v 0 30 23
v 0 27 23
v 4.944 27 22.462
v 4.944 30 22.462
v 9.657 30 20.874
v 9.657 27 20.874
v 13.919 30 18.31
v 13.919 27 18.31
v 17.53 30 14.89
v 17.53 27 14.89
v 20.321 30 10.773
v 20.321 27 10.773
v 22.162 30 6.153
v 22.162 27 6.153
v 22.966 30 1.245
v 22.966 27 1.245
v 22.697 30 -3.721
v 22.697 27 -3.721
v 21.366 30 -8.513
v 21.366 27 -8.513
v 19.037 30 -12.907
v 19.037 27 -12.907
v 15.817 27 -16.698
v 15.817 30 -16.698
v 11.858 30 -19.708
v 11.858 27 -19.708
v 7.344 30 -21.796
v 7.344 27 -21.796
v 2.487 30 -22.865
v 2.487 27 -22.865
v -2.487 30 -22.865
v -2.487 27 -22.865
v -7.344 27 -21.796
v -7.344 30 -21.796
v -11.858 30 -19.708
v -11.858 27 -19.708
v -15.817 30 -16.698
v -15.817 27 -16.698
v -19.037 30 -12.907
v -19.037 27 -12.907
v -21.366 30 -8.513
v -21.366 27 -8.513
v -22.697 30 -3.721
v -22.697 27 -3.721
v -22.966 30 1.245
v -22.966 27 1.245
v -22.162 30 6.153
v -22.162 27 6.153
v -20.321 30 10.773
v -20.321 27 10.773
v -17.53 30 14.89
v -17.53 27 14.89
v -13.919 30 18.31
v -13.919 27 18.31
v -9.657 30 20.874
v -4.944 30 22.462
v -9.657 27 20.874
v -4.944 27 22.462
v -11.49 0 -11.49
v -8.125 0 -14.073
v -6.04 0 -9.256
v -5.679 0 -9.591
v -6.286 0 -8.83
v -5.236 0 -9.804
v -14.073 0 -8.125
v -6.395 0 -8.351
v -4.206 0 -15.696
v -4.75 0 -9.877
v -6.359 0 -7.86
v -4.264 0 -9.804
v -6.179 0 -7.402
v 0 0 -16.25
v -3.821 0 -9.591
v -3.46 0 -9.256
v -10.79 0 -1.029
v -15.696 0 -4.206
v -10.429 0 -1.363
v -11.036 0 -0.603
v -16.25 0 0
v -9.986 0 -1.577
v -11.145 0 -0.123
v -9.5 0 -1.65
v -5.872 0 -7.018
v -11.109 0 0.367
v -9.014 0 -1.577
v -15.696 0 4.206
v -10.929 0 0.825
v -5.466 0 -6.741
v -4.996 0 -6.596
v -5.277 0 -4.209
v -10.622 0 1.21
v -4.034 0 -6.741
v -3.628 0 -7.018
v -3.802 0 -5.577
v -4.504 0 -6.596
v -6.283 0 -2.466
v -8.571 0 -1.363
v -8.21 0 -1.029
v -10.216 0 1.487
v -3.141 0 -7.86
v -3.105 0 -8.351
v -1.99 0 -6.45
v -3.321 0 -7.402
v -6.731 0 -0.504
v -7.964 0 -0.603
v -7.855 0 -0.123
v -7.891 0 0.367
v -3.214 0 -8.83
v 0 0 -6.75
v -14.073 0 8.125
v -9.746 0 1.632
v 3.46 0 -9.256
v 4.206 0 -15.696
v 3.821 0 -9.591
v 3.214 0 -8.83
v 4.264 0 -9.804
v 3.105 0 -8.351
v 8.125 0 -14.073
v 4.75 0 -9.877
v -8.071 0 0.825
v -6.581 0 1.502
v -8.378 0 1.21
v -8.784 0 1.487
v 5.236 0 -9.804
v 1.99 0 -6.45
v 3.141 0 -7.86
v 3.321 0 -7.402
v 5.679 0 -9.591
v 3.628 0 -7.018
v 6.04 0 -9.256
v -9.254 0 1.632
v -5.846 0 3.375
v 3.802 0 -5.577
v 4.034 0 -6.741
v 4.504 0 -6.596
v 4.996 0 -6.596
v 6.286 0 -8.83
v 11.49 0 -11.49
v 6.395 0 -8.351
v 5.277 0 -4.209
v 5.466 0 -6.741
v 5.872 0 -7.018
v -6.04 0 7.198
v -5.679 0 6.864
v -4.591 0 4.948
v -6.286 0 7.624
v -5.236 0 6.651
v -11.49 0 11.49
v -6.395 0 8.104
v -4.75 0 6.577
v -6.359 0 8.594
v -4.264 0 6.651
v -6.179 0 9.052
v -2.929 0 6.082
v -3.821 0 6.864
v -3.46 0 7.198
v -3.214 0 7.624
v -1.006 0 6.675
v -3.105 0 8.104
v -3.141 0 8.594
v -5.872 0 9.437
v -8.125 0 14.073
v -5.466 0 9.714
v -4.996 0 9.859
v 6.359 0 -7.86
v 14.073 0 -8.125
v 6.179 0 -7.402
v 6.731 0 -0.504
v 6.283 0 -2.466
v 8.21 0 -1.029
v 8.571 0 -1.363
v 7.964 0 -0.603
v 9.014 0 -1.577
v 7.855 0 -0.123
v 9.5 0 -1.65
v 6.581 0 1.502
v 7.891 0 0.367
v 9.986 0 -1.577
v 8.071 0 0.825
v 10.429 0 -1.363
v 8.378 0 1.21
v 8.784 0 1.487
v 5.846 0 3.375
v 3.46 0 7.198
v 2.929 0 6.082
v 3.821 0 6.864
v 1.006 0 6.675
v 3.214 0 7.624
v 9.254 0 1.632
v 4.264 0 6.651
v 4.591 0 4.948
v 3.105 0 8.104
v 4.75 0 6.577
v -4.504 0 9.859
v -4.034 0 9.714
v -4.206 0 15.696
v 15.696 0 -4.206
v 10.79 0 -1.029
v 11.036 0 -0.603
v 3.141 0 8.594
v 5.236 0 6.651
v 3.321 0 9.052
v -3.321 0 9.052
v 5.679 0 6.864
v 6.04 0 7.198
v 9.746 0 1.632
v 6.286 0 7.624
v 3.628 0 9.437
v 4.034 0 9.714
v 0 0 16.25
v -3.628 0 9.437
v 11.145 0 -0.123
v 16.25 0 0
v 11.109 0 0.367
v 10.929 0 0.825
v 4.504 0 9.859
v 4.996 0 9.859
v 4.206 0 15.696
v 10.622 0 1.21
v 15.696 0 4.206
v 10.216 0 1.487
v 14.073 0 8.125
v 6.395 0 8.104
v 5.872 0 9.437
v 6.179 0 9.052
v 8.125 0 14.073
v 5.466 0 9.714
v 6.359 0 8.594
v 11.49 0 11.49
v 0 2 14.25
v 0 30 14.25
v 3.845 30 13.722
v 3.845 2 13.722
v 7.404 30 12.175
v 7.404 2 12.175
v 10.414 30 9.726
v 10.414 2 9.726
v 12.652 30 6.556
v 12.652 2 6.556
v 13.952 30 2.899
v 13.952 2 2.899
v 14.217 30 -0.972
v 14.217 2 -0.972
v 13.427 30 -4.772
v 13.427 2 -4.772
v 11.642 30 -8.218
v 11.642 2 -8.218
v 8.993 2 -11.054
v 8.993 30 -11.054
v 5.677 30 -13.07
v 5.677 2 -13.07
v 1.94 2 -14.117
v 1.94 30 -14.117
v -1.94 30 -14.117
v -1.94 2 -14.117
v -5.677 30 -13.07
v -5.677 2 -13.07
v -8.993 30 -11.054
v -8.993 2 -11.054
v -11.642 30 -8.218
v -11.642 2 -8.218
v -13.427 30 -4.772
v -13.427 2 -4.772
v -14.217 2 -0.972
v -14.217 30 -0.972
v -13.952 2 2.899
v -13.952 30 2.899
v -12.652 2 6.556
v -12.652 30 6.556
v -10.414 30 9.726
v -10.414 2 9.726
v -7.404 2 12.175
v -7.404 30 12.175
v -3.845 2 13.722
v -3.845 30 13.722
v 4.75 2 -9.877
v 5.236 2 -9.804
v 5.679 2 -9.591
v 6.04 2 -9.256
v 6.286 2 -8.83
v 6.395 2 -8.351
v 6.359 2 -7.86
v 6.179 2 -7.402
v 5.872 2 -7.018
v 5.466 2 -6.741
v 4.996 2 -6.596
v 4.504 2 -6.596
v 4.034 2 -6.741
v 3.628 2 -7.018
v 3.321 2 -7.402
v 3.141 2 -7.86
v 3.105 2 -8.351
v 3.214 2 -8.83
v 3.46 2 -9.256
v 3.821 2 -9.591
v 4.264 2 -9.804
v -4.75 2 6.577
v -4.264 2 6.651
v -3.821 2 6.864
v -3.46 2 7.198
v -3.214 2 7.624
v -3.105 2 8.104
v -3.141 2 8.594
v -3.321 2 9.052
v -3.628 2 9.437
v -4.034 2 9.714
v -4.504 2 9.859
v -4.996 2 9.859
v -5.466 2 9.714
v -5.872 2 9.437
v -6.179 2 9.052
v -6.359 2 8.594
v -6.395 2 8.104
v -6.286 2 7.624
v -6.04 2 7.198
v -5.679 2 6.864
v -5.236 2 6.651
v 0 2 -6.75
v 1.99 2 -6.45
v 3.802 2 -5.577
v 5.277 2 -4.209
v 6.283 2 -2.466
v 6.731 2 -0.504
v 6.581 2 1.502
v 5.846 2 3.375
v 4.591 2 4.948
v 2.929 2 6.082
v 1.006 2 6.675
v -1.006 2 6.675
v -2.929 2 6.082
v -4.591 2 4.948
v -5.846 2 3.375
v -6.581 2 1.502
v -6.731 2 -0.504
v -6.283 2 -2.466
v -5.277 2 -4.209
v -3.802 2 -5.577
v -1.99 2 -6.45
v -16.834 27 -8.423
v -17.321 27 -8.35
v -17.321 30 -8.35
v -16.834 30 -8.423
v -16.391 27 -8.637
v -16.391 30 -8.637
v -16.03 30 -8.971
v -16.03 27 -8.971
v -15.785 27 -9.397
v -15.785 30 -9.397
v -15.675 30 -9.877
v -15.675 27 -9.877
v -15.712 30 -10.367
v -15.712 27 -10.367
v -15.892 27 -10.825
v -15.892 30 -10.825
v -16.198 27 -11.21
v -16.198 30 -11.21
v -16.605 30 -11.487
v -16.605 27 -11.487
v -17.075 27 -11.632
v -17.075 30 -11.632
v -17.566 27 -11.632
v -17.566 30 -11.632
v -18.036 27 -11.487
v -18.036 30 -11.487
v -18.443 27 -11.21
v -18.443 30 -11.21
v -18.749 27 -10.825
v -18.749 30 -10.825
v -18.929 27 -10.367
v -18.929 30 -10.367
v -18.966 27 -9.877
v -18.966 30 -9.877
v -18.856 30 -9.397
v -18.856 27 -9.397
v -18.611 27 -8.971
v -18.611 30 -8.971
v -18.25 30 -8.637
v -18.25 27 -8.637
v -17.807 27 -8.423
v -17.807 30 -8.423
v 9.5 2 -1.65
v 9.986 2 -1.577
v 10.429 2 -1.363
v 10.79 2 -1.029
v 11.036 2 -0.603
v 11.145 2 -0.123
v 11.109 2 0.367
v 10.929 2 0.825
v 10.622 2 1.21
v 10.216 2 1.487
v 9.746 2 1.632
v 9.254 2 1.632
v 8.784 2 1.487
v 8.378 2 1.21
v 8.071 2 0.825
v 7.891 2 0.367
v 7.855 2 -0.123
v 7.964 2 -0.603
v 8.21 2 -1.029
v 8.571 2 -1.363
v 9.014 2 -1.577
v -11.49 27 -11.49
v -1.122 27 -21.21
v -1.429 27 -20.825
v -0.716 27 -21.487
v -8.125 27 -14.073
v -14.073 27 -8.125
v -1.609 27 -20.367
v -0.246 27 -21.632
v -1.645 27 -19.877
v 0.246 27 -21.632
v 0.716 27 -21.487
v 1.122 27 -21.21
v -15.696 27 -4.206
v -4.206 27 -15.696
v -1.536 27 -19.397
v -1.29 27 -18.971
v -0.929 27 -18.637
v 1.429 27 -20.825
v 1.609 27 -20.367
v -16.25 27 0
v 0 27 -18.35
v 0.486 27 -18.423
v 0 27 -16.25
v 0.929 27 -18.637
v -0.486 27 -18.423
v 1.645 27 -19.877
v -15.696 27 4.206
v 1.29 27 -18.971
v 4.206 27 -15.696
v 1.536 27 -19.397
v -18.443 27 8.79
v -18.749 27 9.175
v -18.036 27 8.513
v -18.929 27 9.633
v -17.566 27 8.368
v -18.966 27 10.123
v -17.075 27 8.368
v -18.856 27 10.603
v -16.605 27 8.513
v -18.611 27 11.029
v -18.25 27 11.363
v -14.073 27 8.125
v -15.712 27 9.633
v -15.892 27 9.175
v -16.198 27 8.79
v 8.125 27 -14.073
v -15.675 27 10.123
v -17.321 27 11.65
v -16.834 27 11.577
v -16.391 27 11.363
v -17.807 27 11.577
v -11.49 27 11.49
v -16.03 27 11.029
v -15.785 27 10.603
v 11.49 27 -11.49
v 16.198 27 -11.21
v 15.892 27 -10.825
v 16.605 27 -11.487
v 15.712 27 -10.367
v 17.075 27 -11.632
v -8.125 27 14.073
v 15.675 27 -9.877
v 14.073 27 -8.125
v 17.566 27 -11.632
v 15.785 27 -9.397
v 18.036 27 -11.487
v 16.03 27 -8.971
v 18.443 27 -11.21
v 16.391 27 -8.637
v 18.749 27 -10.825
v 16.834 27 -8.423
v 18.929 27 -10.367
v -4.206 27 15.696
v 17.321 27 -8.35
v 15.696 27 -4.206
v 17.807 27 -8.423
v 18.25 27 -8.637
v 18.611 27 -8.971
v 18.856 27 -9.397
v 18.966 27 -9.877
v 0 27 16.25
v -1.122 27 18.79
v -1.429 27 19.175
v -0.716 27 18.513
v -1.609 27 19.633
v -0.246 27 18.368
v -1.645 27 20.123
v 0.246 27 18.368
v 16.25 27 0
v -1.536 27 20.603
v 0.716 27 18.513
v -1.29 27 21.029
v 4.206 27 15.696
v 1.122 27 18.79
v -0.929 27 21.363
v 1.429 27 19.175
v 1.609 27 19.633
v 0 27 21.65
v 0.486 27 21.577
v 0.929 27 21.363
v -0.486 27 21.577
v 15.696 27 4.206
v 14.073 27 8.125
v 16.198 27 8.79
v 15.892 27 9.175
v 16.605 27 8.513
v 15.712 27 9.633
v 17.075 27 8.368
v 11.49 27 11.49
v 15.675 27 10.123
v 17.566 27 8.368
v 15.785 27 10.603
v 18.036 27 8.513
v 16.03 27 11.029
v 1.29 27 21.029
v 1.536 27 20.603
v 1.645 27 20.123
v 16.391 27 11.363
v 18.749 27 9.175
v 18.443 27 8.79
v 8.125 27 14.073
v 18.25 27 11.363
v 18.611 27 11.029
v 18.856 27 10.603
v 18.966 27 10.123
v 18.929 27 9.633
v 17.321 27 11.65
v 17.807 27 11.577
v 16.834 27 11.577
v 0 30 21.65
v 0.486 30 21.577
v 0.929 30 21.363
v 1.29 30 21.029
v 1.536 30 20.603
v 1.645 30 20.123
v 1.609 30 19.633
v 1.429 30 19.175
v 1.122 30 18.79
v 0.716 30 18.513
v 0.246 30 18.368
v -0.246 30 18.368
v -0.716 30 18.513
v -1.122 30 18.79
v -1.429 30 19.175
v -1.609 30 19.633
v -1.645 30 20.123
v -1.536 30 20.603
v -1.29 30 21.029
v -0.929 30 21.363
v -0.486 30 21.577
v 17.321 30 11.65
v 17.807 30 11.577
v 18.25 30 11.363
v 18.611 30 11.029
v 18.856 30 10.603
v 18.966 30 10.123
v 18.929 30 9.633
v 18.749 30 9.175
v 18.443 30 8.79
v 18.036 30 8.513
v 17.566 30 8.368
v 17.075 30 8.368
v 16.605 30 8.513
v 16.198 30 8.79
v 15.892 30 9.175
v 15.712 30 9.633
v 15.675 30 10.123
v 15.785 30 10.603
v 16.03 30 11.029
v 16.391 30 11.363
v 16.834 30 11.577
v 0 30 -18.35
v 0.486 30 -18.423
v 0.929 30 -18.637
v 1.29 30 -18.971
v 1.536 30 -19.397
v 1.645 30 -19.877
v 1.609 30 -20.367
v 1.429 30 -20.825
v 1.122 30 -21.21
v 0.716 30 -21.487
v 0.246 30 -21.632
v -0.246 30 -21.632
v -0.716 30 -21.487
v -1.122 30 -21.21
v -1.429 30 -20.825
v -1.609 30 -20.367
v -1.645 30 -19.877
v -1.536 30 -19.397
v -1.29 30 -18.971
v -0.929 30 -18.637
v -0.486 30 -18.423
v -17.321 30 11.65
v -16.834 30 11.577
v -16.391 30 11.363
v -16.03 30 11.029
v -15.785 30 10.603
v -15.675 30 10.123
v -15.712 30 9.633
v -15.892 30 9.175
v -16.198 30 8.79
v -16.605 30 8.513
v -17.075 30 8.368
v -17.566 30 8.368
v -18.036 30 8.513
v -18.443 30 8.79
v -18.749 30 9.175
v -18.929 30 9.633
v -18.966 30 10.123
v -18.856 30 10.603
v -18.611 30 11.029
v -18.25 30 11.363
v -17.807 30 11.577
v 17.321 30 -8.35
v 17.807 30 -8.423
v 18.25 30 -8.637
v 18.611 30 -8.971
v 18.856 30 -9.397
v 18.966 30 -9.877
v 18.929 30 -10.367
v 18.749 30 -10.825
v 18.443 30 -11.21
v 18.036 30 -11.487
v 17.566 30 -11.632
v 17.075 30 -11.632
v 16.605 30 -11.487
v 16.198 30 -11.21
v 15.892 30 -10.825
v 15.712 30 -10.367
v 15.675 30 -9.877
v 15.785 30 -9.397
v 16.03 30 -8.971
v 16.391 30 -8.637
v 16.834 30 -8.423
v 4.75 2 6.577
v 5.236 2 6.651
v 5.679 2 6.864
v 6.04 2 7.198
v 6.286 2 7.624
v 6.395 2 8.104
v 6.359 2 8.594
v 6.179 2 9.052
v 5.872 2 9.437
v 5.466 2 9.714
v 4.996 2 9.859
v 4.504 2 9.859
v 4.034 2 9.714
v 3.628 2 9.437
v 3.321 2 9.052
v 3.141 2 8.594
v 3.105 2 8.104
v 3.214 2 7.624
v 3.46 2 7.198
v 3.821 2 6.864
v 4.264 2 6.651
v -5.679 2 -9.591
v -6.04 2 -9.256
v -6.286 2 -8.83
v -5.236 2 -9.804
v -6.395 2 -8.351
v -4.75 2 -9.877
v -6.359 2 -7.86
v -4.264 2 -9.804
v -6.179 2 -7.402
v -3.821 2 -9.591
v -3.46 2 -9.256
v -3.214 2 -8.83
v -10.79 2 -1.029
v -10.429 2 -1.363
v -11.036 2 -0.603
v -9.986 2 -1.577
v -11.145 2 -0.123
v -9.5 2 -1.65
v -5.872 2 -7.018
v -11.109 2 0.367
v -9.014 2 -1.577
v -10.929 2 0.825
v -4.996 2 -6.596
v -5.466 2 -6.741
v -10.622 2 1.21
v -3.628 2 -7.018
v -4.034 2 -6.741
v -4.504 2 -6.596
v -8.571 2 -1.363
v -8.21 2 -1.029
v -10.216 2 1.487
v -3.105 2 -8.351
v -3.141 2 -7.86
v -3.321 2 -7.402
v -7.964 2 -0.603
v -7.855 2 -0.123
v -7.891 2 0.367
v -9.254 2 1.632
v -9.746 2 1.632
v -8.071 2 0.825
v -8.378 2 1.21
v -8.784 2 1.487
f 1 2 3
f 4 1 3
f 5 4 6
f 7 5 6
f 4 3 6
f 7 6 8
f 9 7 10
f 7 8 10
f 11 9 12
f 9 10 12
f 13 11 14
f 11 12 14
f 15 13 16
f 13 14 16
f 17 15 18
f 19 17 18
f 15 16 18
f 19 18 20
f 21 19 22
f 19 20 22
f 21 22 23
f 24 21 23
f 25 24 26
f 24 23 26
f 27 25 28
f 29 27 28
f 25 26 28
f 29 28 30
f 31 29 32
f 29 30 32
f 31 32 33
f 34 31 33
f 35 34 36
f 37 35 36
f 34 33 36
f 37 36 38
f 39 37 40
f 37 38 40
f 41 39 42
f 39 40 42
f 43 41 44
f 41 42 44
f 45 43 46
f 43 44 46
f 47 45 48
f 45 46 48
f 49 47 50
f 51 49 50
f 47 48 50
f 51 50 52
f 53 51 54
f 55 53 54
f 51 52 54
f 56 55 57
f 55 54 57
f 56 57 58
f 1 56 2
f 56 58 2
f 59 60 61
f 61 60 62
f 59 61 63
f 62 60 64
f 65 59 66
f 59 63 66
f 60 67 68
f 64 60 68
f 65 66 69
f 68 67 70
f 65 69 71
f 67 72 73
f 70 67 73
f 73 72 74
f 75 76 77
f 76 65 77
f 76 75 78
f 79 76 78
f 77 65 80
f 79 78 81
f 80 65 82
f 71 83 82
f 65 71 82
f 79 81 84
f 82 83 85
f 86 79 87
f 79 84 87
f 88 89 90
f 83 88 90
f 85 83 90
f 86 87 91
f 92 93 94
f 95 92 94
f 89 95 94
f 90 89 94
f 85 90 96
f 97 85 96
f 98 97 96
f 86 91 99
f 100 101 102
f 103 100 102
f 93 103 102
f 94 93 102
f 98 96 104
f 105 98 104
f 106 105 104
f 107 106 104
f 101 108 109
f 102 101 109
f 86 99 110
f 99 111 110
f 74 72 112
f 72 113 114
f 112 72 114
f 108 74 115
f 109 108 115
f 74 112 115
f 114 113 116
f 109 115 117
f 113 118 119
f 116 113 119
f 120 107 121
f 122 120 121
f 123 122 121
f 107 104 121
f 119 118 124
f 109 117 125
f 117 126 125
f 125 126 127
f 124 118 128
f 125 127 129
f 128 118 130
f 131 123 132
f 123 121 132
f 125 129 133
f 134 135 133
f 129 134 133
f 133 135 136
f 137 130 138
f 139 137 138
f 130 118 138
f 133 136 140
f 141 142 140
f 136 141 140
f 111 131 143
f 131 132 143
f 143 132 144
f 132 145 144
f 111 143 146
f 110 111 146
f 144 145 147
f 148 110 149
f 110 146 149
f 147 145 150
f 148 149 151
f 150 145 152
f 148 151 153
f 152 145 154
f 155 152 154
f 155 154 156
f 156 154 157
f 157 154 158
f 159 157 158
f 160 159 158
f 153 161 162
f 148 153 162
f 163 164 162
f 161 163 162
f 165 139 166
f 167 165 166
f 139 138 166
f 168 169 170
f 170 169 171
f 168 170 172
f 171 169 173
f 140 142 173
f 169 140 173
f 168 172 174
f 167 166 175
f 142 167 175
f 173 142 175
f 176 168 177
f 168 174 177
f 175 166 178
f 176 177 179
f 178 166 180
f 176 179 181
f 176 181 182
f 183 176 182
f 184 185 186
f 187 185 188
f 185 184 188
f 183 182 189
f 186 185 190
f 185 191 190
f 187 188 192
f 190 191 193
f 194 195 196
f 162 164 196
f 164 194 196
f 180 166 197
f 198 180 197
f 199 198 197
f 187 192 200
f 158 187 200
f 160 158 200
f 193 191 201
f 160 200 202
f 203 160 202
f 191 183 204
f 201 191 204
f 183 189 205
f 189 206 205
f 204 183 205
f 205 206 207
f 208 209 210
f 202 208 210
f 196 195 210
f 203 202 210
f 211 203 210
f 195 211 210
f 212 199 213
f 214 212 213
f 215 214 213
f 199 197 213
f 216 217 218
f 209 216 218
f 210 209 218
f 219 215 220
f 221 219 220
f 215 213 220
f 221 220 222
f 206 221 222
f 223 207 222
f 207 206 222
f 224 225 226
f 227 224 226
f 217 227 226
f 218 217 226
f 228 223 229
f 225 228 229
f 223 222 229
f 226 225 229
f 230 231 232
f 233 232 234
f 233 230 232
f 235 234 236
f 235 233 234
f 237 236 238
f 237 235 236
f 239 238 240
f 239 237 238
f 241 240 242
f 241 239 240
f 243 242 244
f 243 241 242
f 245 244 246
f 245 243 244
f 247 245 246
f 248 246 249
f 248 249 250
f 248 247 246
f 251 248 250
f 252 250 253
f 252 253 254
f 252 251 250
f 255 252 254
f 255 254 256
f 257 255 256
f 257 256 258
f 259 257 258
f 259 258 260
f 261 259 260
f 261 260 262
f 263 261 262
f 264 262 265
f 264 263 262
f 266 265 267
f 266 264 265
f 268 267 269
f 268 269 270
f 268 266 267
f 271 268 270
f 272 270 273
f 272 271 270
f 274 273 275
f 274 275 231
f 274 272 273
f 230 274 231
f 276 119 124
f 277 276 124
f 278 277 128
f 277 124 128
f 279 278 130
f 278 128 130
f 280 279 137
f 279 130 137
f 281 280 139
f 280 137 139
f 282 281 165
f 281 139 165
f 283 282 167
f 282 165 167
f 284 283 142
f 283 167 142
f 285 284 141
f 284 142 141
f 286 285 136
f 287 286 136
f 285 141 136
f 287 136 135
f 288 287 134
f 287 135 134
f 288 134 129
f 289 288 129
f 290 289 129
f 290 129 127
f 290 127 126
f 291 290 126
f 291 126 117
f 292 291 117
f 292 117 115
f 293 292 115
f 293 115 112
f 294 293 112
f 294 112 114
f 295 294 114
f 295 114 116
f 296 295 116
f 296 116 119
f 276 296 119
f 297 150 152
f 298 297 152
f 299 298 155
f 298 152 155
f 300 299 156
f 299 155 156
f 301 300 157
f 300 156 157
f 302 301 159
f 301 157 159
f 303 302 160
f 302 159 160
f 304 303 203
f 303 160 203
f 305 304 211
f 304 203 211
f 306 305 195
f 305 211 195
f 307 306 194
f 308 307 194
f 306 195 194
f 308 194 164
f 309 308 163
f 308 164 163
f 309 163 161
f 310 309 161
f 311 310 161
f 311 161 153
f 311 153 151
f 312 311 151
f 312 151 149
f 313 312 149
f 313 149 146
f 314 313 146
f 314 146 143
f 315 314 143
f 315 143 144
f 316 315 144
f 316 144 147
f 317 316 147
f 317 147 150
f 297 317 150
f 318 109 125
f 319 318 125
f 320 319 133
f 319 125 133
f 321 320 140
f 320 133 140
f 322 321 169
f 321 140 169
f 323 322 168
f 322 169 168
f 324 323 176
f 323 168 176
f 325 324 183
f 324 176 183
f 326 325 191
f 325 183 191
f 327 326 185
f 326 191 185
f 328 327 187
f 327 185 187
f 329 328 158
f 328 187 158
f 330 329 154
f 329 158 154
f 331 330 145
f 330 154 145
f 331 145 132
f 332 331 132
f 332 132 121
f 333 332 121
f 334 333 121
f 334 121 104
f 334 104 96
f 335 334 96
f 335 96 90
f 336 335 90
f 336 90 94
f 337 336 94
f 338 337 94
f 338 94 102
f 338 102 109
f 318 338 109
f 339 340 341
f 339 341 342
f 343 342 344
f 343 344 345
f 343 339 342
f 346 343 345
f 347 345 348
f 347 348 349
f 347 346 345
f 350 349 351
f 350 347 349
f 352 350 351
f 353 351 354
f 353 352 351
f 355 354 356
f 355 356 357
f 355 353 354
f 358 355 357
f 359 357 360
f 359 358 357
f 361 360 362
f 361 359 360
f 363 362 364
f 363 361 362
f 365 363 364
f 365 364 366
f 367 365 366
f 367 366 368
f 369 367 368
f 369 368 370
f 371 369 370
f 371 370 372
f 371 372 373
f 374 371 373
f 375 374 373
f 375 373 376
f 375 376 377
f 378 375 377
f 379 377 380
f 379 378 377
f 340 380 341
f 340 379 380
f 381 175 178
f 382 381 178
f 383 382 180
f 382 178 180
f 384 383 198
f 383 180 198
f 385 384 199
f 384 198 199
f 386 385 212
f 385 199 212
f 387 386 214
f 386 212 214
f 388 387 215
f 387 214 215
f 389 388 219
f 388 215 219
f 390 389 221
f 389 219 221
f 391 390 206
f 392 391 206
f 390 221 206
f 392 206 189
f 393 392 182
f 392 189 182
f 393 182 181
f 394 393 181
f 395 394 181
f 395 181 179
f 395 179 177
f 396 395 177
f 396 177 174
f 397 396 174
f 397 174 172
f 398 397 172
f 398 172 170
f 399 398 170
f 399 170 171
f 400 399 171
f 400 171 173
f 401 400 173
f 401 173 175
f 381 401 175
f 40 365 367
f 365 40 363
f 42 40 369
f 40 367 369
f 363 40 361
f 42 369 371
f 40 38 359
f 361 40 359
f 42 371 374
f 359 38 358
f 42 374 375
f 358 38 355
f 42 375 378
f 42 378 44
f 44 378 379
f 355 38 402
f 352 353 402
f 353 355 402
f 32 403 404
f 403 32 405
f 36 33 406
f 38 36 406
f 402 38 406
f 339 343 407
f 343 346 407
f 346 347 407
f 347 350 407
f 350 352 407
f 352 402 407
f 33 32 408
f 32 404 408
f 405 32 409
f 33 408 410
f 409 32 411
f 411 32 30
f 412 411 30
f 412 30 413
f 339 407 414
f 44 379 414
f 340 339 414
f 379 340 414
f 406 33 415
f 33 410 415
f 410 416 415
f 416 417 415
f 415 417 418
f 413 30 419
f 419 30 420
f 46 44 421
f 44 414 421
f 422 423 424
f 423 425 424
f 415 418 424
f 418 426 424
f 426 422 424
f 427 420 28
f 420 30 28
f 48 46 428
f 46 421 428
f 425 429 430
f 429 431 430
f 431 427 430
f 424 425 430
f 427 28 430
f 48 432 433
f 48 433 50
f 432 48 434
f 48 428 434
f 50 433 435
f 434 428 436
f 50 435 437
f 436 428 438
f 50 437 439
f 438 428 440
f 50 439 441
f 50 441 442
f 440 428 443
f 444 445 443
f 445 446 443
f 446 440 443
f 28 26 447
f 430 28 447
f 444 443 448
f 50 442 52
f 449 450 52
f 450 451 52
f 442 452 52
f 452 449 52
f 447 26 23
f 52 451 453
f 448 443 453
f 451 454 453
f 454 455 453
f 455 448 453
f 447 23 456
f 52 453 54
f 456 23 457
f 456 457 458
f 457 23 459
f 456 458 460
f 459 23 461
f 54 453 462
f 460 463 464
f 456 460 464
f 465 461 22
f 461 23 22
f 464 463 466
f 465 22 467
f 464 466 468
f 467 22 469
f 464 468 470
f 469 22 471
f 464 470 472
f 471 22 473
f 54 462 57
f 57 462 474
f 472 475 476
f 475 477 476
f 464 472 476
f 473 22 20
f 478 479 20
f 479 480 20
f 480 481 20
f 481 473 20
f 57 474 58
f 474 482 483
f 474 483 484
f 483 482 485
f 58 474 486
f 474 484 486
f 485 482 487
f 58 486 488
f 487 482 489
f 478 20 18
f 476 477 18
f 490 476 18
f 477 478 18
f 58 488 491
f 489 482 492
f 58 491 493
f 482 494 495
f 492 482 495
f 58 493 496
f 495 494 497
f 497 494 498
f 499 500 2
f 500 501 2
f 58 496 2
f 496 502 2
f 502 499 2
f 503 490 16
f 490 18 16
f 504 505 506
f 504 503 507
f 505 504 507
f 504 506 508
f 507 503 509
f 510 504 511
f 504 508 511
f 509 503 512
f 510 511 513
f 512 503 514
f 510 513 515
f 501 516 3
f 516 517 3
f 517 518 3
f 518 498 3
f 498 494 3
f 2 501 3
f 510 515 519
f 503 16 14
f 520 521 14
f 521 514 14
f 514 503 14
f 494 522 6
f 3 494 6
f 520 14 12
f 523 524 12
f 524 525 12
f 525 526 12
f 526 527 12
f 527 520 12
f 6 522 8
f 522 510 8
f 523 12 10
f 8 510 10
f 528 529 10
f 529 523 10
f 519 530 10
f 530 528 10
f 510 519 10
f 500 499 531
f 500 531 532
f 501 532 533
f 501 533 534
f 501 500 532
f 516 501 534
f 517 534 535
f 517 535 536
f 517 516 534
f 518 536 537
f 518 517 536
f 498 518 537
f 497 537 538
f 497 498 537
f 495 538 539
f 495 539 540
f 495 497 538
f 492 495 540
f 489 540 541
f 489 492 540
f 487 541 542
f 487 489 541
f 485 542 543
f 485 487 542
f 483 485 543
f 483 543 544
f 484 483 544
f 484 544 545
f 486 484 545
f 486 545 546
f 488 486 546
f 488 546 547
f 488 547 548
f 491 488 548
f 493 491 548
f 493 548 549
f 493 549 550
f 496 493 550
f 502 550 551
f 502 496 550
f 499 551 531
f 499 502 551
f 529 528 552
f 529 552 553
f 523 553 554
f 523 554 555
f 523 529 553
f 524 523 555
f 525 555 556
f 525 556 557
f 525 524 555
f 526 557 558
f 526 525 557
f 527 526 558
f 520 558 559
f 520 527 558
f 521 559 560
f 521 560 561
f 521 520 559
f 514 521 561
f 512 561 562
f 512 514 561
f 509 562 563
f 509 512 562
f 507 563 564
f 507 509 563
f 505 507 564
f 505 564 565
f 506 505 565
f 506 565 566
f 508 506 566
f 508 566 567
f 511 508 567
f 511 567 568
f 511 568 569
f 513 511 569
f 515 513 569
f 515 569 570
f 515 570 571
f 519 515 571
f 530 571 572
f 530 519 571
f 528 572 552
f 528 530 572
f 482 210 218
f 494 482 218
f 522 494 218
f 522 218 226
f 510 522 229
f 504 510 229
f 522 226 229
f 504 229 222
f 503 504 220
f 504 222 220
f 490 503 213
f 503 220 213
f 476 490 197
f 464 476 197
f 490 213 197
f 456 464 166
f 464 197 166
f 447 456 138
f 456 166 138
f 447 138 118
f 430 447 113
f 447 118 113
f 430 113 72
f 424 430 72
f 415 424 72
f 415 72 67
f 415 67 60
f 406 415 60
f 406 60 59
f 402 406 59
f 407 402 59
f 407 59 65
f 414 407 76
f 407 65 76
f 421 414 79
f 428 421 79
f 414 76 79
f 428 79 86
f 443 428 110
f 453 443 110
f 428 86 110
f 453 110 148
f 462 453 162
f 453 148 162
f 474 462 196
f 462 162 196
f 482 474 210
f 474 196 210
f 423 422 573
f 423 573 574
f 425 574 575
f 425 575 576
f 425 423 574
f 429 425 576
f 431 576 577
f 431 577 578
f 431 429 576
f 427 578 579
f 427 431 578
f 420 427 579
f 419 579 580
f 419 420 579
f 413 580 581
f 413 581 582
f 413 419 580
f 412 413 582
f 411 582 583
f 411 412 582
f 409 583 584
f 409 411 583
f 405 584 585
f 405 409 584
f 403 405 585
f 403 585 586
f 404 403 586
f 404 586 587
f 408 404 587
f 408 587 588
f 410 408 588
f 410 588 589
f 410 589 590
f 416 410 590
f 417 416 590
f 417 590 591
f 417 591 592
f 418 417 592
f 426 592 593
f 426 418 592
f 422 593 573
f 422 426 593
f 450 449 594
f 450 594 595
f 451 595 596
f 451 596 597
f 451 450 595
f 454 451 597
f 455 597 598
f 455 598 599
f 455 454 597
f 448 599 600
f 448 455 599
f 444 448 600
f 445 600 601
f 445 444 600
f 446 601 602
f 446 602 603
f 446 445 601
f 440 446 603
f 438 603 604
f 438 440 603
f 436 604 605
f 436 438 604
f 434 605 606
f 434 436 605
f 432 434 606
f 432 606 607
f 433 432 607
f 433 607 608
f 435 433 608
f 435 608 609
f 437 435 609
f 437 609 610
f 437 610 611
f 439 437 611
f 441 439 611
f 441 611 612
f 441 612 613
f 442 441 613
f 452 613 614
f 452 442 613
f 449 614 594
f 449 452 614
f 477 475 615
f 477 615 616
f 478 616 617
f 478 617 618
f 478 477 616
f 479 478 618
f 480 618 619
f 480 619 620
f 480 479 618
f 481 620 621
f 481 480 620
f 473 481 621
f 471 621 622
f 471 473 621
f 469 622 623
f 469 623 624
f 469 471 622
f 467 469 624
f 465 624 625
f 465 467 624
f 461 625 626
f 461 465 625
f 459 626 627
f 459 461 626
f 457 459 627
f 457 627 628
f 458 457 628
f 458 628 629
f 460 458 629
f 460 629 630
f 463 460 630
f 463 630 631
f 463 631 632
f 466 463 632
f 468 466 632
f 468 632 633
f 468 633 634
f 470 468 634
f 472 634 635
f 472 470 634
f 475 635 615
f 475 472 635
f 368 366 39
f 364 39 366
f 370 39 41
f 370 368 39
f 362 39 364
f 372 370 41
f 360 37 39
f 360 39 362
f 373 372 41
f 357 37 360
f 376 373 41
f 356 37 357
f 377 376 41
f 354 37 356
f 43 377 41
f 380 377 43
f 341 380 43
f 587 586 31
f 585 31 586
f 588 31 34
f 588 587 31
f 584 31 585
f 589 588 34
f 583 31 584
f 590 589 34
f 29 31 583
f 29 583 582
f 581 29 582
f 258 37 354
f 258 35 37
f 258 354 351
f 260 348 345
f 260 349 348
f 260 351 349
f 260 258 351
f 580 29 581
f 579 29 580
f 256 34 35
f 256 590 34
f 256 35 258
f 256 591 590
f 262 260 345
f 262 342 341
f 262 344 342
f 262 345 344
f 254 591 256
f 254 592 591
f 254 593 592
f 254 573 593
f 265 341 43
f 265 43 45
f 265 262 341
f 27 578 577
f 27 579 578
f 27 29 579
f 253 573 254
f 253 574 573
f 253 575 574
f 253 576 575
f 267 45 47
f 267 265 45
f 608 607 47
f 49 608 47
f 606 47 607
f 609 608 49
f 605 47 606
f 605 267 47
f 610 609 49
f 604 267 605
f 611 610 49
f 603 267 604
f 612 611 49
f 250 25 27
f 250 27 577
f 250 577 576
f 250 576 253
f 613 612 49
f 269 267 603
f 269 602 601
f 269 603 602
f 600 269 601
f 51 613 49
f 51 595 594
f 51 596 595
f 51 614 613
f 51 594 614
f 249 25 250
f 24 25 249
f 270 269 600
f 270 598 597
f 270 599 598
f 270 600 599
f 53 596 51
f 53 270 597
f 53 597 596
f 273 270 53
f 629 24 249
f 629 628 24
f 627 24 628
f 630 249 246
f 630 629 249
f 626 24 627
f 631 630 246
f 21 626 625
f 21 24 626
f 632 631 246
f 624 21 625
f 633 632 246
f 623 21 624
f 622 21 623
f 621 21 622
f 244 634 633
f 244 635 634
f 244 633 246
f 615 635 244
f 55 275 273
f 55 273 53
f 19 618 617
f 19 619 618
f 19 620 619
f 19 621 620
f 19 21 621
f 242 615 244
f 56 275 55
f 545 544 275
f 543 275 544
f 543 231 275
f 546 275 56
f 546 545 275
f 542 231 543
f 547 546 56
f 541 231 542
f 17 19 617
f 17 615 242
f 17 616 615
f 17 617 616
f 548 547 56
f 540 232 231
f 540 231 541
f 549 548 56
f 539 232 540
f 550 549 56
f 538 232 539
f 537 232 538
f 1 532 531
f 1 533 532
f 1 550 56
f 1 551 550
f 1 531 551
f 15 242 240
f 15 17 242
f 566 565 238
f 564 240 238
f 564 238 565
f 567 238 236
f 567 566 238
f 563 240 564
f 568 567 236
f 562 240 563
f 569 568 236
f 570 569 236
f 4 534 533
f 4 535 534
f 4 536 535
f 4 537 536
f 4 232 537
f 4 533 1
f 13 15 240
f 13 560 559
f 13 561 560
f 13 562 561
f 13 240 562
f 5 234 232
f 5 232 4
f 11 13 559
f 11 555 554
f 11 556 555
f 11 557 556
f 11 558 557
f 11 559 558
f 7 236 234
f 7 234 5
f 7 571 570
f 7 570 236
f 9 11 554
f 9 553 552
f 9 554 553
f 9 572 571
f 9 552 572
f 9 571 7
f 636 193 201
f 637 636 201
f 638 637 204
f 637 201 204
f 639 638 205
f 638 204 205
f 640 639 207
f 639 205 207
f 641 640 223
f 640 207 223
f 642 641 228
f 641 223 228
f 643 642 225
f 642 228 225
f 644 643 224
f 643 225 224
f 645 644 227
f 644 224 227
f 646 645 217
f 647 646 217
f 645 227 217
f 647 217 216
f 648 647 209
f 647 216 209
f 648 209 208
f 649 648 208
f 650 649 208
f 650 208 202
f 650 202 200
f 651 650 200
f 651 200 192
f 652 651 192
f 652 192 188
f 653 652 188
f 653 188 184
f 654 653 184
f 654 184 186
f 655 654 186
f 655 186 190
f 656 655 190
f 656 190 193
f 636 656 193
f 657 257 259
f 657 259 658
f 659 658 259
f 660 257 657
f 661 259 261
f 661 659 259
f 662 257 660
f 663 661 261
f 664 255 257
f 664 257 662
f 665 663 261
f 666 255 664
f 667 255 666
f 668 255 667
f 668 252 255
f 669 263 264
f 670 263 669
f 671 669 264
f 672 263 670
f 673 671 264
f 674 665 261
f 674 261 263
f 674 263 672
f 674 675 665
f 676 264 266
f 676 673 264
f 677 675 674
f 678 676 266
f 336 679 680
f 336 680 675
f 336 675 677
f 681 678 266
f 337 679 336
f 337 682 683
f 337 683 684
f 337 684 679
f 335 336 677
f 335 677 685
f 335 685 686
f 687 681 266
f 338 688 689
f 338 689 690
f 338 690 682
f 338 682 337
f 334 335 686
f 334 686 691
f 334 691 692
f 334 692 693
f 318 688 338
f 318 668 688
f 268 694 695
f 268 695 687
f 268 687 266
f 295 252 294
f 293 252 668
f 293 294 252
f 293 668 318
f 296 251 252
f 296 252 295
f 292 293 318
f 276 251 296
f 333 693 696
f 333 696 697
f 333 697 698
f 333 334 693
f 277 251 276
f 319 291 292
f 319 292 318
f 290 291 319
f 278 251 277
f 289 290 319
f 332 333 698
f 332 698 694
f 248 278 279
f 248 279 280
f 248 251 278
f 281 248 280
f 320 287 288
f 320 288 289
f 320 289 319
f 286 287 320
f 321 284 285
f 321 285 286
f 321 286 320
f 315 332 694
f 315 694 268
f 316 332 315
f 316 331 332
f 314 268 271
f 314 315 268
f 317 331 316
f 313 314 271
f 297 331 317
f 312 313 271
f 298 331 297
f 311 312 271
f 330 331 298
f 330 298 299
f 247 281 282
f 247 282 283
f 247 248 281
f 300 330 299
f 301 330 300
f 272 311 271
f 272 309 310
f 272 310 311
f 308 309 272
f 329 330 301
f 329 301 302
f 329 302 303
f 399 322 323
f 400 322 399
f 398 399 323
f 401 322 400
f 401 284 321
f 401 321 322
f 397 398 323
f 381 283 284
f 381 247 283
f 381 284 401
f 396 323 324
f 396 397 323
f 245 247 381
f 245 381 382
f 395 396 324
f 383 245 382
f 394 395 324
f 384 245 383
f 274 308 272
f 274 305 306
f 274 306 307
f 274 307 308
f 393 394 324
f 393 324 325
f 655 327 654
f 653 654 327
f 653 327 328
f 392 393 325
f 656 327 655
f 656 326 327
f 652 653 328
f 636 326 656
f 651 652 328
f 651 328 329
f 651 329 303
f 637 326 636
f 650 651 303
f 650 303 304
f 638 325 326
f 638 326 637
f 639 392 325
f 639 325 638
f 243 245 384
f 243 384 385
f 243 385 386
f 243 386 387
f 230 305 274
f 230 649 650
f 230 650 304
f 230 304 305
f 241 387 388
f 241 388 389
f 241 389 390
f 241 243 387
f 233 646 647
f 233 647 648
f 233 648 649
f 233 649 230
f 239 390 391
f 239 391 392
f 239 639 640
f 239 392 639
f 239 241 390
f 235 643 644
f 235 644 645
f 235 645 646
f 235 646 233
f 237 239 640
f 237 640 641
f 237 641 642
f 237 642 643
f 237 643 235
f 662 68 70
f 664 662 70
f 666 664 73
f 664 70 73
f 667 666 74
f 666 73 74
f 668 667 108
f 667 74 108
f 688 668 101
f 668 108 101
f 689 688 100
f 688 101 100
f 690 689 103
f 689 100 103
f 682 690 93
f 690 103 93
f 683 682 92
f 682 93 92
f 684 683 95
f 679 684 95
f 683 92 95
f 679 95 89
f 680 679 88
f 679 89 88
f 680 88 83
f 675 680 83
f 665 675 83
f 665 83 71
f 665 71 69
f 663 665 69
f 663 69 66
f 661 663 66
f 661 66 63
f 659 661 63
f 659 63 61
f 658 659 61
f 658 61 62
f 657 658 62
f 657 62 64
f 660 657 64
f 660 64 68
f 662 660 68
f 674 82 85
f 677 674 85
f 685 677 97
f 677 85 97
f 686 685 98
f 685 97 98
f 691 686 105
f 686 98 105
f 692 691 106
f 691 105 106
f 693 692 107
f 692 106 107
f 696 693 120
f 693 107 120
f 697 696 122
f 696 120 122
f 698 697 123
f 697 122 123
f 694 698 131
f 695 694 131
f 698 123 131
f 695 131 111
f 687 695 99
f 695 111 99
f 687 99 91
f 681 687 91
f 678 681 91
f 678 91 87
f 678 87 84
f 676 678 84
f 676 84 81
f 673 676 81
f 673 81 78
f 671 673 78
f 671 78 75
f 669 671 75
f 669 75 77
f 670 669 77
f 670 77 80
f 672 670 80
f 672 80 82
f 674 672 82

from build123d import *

# Parameters (mm, degrees)
SKETCH_1_R          = 16.25
EXTRUDE_1_DEPTH     = 27
SHELL_1_T           = -2
SKETCH_2_R          = 6.75
SKETCH_2_R_2        = 1.65
CUT_EXTRUDE_1_DEPTH = 27
SKETCH_3_R          = 23
SKETCH_3_R_2        = 14.25
SKETCH_3_R_3        = 1.65
EXTRUDE_2_DEPTH     = 3


with BuildPart() as part:
    # 草图1 → 凸台-拉伸1 (new body)
    with BuildSketch(Plane(origin=(0, 0, 0), x_dir=(1, 0, 0), z_dir=(0, 1, 0))):
        with Locations(Location((0, 0, 0), (0, 0, 270))):
            Circle(SKETCH_1_R)
    extrude(amount=EXTRUDE_1_DEPTH)

    # 抽壳1
    shell_1_openings = [part.faces().sort_by_distance(p)[0] for p in [
        (0, 27, 0),
    ]]
    offset(amount=SHELL_1_T, openings=shell_1_openings, kind=Kind.INTERSECTION)

    # 草图2 → 切除-拉伸1 (cut)
    with BuildSketch(Plane.XZ):
        with Locations(Location((0, 0, 0), (0, 0, 270))):
            Circle(SKETCH_2_R)
        with Locations(Location((4.75, 8.227241336, 0), (0, 0, 270))):
            Circle(SKETCH_2_R_2)
        with Locations(Location((9.5, 0, 0), (0, 0, 270))):
            Circle(SKETCH_2_R_2)
        with Locations(Location((4.75, -8.227241336, 0), (0, 0, 270))):
            Circle(SKETCH_2_R_2)
        with Locations(Location((-4.75, -8.227241336, 0), (0, 0, 270))):
            Circle(SKETCH_2_R_2)
        with Locations(Location((-9.5, 0, 0), (0, 0, 270))):
            Circle(SKETCH_2_R_2)
        with Locations(Location((-4.75, 8.227241336, 0), (0, 0, 270))):
            Circle(SKETCH_2_R_2)
    extrude(amount=-CUT_EXTRUDE_1_DEPTH, mode=Mode.SUBTRACT)

    # 草图3 → 凸台-拉伸2 (add)
    with BuildSketch(Plane(origin=(0, 27, 0), x_dir=(1, 0, 0), z_dir=(0, 1, 0))):
        with Locations(Location((0, 0, 0), (0, 0, 270))):
            Circle(SKETCH_3_R)
        with Locations(Location((0, 0, 0), (0, 0, 270))):
            Circle(SKETCH_3_R_2, mode=Mode.SUBTRACT)
        with Locations(Location((0, 20, 0), (0, 0, 270))):
            Circle(SKETCH_3_R_3, mode=Mode.SUBTRACT)
        with Locations(Location((17.320508076, 10, 0), (0, 0, 270))):
            Circle(SKETCH_3_R_3, mode=Mode.SUBTRACT)
        with Locations(Location((17.320508076, -10, 0), (0, 0, 270))):
            Circle(SKETCH_3_R_3, mode=Mode.SUBTRACT)
        with Locations(Location((0, -20, 0), (0, 0, 270))):
            Circle(SKETCH_3_R_3, mode=Mode.SUBTRACT)
        with Locations(Location((-17.320508076, -10, 0), (0, 0, 270))):
            Circle(SKETCH_3_R_3, mode=Mode.SUBTRACT)
        with Locations(Location((-17.320508076, 10, 0), (0, 0, 270))):
            Circle(SKETCH_3_R_3, mode=Mode.SUBTRACT)
    extrude(amount=EXTRUDE_2_DEPTH)


solid = part.part
